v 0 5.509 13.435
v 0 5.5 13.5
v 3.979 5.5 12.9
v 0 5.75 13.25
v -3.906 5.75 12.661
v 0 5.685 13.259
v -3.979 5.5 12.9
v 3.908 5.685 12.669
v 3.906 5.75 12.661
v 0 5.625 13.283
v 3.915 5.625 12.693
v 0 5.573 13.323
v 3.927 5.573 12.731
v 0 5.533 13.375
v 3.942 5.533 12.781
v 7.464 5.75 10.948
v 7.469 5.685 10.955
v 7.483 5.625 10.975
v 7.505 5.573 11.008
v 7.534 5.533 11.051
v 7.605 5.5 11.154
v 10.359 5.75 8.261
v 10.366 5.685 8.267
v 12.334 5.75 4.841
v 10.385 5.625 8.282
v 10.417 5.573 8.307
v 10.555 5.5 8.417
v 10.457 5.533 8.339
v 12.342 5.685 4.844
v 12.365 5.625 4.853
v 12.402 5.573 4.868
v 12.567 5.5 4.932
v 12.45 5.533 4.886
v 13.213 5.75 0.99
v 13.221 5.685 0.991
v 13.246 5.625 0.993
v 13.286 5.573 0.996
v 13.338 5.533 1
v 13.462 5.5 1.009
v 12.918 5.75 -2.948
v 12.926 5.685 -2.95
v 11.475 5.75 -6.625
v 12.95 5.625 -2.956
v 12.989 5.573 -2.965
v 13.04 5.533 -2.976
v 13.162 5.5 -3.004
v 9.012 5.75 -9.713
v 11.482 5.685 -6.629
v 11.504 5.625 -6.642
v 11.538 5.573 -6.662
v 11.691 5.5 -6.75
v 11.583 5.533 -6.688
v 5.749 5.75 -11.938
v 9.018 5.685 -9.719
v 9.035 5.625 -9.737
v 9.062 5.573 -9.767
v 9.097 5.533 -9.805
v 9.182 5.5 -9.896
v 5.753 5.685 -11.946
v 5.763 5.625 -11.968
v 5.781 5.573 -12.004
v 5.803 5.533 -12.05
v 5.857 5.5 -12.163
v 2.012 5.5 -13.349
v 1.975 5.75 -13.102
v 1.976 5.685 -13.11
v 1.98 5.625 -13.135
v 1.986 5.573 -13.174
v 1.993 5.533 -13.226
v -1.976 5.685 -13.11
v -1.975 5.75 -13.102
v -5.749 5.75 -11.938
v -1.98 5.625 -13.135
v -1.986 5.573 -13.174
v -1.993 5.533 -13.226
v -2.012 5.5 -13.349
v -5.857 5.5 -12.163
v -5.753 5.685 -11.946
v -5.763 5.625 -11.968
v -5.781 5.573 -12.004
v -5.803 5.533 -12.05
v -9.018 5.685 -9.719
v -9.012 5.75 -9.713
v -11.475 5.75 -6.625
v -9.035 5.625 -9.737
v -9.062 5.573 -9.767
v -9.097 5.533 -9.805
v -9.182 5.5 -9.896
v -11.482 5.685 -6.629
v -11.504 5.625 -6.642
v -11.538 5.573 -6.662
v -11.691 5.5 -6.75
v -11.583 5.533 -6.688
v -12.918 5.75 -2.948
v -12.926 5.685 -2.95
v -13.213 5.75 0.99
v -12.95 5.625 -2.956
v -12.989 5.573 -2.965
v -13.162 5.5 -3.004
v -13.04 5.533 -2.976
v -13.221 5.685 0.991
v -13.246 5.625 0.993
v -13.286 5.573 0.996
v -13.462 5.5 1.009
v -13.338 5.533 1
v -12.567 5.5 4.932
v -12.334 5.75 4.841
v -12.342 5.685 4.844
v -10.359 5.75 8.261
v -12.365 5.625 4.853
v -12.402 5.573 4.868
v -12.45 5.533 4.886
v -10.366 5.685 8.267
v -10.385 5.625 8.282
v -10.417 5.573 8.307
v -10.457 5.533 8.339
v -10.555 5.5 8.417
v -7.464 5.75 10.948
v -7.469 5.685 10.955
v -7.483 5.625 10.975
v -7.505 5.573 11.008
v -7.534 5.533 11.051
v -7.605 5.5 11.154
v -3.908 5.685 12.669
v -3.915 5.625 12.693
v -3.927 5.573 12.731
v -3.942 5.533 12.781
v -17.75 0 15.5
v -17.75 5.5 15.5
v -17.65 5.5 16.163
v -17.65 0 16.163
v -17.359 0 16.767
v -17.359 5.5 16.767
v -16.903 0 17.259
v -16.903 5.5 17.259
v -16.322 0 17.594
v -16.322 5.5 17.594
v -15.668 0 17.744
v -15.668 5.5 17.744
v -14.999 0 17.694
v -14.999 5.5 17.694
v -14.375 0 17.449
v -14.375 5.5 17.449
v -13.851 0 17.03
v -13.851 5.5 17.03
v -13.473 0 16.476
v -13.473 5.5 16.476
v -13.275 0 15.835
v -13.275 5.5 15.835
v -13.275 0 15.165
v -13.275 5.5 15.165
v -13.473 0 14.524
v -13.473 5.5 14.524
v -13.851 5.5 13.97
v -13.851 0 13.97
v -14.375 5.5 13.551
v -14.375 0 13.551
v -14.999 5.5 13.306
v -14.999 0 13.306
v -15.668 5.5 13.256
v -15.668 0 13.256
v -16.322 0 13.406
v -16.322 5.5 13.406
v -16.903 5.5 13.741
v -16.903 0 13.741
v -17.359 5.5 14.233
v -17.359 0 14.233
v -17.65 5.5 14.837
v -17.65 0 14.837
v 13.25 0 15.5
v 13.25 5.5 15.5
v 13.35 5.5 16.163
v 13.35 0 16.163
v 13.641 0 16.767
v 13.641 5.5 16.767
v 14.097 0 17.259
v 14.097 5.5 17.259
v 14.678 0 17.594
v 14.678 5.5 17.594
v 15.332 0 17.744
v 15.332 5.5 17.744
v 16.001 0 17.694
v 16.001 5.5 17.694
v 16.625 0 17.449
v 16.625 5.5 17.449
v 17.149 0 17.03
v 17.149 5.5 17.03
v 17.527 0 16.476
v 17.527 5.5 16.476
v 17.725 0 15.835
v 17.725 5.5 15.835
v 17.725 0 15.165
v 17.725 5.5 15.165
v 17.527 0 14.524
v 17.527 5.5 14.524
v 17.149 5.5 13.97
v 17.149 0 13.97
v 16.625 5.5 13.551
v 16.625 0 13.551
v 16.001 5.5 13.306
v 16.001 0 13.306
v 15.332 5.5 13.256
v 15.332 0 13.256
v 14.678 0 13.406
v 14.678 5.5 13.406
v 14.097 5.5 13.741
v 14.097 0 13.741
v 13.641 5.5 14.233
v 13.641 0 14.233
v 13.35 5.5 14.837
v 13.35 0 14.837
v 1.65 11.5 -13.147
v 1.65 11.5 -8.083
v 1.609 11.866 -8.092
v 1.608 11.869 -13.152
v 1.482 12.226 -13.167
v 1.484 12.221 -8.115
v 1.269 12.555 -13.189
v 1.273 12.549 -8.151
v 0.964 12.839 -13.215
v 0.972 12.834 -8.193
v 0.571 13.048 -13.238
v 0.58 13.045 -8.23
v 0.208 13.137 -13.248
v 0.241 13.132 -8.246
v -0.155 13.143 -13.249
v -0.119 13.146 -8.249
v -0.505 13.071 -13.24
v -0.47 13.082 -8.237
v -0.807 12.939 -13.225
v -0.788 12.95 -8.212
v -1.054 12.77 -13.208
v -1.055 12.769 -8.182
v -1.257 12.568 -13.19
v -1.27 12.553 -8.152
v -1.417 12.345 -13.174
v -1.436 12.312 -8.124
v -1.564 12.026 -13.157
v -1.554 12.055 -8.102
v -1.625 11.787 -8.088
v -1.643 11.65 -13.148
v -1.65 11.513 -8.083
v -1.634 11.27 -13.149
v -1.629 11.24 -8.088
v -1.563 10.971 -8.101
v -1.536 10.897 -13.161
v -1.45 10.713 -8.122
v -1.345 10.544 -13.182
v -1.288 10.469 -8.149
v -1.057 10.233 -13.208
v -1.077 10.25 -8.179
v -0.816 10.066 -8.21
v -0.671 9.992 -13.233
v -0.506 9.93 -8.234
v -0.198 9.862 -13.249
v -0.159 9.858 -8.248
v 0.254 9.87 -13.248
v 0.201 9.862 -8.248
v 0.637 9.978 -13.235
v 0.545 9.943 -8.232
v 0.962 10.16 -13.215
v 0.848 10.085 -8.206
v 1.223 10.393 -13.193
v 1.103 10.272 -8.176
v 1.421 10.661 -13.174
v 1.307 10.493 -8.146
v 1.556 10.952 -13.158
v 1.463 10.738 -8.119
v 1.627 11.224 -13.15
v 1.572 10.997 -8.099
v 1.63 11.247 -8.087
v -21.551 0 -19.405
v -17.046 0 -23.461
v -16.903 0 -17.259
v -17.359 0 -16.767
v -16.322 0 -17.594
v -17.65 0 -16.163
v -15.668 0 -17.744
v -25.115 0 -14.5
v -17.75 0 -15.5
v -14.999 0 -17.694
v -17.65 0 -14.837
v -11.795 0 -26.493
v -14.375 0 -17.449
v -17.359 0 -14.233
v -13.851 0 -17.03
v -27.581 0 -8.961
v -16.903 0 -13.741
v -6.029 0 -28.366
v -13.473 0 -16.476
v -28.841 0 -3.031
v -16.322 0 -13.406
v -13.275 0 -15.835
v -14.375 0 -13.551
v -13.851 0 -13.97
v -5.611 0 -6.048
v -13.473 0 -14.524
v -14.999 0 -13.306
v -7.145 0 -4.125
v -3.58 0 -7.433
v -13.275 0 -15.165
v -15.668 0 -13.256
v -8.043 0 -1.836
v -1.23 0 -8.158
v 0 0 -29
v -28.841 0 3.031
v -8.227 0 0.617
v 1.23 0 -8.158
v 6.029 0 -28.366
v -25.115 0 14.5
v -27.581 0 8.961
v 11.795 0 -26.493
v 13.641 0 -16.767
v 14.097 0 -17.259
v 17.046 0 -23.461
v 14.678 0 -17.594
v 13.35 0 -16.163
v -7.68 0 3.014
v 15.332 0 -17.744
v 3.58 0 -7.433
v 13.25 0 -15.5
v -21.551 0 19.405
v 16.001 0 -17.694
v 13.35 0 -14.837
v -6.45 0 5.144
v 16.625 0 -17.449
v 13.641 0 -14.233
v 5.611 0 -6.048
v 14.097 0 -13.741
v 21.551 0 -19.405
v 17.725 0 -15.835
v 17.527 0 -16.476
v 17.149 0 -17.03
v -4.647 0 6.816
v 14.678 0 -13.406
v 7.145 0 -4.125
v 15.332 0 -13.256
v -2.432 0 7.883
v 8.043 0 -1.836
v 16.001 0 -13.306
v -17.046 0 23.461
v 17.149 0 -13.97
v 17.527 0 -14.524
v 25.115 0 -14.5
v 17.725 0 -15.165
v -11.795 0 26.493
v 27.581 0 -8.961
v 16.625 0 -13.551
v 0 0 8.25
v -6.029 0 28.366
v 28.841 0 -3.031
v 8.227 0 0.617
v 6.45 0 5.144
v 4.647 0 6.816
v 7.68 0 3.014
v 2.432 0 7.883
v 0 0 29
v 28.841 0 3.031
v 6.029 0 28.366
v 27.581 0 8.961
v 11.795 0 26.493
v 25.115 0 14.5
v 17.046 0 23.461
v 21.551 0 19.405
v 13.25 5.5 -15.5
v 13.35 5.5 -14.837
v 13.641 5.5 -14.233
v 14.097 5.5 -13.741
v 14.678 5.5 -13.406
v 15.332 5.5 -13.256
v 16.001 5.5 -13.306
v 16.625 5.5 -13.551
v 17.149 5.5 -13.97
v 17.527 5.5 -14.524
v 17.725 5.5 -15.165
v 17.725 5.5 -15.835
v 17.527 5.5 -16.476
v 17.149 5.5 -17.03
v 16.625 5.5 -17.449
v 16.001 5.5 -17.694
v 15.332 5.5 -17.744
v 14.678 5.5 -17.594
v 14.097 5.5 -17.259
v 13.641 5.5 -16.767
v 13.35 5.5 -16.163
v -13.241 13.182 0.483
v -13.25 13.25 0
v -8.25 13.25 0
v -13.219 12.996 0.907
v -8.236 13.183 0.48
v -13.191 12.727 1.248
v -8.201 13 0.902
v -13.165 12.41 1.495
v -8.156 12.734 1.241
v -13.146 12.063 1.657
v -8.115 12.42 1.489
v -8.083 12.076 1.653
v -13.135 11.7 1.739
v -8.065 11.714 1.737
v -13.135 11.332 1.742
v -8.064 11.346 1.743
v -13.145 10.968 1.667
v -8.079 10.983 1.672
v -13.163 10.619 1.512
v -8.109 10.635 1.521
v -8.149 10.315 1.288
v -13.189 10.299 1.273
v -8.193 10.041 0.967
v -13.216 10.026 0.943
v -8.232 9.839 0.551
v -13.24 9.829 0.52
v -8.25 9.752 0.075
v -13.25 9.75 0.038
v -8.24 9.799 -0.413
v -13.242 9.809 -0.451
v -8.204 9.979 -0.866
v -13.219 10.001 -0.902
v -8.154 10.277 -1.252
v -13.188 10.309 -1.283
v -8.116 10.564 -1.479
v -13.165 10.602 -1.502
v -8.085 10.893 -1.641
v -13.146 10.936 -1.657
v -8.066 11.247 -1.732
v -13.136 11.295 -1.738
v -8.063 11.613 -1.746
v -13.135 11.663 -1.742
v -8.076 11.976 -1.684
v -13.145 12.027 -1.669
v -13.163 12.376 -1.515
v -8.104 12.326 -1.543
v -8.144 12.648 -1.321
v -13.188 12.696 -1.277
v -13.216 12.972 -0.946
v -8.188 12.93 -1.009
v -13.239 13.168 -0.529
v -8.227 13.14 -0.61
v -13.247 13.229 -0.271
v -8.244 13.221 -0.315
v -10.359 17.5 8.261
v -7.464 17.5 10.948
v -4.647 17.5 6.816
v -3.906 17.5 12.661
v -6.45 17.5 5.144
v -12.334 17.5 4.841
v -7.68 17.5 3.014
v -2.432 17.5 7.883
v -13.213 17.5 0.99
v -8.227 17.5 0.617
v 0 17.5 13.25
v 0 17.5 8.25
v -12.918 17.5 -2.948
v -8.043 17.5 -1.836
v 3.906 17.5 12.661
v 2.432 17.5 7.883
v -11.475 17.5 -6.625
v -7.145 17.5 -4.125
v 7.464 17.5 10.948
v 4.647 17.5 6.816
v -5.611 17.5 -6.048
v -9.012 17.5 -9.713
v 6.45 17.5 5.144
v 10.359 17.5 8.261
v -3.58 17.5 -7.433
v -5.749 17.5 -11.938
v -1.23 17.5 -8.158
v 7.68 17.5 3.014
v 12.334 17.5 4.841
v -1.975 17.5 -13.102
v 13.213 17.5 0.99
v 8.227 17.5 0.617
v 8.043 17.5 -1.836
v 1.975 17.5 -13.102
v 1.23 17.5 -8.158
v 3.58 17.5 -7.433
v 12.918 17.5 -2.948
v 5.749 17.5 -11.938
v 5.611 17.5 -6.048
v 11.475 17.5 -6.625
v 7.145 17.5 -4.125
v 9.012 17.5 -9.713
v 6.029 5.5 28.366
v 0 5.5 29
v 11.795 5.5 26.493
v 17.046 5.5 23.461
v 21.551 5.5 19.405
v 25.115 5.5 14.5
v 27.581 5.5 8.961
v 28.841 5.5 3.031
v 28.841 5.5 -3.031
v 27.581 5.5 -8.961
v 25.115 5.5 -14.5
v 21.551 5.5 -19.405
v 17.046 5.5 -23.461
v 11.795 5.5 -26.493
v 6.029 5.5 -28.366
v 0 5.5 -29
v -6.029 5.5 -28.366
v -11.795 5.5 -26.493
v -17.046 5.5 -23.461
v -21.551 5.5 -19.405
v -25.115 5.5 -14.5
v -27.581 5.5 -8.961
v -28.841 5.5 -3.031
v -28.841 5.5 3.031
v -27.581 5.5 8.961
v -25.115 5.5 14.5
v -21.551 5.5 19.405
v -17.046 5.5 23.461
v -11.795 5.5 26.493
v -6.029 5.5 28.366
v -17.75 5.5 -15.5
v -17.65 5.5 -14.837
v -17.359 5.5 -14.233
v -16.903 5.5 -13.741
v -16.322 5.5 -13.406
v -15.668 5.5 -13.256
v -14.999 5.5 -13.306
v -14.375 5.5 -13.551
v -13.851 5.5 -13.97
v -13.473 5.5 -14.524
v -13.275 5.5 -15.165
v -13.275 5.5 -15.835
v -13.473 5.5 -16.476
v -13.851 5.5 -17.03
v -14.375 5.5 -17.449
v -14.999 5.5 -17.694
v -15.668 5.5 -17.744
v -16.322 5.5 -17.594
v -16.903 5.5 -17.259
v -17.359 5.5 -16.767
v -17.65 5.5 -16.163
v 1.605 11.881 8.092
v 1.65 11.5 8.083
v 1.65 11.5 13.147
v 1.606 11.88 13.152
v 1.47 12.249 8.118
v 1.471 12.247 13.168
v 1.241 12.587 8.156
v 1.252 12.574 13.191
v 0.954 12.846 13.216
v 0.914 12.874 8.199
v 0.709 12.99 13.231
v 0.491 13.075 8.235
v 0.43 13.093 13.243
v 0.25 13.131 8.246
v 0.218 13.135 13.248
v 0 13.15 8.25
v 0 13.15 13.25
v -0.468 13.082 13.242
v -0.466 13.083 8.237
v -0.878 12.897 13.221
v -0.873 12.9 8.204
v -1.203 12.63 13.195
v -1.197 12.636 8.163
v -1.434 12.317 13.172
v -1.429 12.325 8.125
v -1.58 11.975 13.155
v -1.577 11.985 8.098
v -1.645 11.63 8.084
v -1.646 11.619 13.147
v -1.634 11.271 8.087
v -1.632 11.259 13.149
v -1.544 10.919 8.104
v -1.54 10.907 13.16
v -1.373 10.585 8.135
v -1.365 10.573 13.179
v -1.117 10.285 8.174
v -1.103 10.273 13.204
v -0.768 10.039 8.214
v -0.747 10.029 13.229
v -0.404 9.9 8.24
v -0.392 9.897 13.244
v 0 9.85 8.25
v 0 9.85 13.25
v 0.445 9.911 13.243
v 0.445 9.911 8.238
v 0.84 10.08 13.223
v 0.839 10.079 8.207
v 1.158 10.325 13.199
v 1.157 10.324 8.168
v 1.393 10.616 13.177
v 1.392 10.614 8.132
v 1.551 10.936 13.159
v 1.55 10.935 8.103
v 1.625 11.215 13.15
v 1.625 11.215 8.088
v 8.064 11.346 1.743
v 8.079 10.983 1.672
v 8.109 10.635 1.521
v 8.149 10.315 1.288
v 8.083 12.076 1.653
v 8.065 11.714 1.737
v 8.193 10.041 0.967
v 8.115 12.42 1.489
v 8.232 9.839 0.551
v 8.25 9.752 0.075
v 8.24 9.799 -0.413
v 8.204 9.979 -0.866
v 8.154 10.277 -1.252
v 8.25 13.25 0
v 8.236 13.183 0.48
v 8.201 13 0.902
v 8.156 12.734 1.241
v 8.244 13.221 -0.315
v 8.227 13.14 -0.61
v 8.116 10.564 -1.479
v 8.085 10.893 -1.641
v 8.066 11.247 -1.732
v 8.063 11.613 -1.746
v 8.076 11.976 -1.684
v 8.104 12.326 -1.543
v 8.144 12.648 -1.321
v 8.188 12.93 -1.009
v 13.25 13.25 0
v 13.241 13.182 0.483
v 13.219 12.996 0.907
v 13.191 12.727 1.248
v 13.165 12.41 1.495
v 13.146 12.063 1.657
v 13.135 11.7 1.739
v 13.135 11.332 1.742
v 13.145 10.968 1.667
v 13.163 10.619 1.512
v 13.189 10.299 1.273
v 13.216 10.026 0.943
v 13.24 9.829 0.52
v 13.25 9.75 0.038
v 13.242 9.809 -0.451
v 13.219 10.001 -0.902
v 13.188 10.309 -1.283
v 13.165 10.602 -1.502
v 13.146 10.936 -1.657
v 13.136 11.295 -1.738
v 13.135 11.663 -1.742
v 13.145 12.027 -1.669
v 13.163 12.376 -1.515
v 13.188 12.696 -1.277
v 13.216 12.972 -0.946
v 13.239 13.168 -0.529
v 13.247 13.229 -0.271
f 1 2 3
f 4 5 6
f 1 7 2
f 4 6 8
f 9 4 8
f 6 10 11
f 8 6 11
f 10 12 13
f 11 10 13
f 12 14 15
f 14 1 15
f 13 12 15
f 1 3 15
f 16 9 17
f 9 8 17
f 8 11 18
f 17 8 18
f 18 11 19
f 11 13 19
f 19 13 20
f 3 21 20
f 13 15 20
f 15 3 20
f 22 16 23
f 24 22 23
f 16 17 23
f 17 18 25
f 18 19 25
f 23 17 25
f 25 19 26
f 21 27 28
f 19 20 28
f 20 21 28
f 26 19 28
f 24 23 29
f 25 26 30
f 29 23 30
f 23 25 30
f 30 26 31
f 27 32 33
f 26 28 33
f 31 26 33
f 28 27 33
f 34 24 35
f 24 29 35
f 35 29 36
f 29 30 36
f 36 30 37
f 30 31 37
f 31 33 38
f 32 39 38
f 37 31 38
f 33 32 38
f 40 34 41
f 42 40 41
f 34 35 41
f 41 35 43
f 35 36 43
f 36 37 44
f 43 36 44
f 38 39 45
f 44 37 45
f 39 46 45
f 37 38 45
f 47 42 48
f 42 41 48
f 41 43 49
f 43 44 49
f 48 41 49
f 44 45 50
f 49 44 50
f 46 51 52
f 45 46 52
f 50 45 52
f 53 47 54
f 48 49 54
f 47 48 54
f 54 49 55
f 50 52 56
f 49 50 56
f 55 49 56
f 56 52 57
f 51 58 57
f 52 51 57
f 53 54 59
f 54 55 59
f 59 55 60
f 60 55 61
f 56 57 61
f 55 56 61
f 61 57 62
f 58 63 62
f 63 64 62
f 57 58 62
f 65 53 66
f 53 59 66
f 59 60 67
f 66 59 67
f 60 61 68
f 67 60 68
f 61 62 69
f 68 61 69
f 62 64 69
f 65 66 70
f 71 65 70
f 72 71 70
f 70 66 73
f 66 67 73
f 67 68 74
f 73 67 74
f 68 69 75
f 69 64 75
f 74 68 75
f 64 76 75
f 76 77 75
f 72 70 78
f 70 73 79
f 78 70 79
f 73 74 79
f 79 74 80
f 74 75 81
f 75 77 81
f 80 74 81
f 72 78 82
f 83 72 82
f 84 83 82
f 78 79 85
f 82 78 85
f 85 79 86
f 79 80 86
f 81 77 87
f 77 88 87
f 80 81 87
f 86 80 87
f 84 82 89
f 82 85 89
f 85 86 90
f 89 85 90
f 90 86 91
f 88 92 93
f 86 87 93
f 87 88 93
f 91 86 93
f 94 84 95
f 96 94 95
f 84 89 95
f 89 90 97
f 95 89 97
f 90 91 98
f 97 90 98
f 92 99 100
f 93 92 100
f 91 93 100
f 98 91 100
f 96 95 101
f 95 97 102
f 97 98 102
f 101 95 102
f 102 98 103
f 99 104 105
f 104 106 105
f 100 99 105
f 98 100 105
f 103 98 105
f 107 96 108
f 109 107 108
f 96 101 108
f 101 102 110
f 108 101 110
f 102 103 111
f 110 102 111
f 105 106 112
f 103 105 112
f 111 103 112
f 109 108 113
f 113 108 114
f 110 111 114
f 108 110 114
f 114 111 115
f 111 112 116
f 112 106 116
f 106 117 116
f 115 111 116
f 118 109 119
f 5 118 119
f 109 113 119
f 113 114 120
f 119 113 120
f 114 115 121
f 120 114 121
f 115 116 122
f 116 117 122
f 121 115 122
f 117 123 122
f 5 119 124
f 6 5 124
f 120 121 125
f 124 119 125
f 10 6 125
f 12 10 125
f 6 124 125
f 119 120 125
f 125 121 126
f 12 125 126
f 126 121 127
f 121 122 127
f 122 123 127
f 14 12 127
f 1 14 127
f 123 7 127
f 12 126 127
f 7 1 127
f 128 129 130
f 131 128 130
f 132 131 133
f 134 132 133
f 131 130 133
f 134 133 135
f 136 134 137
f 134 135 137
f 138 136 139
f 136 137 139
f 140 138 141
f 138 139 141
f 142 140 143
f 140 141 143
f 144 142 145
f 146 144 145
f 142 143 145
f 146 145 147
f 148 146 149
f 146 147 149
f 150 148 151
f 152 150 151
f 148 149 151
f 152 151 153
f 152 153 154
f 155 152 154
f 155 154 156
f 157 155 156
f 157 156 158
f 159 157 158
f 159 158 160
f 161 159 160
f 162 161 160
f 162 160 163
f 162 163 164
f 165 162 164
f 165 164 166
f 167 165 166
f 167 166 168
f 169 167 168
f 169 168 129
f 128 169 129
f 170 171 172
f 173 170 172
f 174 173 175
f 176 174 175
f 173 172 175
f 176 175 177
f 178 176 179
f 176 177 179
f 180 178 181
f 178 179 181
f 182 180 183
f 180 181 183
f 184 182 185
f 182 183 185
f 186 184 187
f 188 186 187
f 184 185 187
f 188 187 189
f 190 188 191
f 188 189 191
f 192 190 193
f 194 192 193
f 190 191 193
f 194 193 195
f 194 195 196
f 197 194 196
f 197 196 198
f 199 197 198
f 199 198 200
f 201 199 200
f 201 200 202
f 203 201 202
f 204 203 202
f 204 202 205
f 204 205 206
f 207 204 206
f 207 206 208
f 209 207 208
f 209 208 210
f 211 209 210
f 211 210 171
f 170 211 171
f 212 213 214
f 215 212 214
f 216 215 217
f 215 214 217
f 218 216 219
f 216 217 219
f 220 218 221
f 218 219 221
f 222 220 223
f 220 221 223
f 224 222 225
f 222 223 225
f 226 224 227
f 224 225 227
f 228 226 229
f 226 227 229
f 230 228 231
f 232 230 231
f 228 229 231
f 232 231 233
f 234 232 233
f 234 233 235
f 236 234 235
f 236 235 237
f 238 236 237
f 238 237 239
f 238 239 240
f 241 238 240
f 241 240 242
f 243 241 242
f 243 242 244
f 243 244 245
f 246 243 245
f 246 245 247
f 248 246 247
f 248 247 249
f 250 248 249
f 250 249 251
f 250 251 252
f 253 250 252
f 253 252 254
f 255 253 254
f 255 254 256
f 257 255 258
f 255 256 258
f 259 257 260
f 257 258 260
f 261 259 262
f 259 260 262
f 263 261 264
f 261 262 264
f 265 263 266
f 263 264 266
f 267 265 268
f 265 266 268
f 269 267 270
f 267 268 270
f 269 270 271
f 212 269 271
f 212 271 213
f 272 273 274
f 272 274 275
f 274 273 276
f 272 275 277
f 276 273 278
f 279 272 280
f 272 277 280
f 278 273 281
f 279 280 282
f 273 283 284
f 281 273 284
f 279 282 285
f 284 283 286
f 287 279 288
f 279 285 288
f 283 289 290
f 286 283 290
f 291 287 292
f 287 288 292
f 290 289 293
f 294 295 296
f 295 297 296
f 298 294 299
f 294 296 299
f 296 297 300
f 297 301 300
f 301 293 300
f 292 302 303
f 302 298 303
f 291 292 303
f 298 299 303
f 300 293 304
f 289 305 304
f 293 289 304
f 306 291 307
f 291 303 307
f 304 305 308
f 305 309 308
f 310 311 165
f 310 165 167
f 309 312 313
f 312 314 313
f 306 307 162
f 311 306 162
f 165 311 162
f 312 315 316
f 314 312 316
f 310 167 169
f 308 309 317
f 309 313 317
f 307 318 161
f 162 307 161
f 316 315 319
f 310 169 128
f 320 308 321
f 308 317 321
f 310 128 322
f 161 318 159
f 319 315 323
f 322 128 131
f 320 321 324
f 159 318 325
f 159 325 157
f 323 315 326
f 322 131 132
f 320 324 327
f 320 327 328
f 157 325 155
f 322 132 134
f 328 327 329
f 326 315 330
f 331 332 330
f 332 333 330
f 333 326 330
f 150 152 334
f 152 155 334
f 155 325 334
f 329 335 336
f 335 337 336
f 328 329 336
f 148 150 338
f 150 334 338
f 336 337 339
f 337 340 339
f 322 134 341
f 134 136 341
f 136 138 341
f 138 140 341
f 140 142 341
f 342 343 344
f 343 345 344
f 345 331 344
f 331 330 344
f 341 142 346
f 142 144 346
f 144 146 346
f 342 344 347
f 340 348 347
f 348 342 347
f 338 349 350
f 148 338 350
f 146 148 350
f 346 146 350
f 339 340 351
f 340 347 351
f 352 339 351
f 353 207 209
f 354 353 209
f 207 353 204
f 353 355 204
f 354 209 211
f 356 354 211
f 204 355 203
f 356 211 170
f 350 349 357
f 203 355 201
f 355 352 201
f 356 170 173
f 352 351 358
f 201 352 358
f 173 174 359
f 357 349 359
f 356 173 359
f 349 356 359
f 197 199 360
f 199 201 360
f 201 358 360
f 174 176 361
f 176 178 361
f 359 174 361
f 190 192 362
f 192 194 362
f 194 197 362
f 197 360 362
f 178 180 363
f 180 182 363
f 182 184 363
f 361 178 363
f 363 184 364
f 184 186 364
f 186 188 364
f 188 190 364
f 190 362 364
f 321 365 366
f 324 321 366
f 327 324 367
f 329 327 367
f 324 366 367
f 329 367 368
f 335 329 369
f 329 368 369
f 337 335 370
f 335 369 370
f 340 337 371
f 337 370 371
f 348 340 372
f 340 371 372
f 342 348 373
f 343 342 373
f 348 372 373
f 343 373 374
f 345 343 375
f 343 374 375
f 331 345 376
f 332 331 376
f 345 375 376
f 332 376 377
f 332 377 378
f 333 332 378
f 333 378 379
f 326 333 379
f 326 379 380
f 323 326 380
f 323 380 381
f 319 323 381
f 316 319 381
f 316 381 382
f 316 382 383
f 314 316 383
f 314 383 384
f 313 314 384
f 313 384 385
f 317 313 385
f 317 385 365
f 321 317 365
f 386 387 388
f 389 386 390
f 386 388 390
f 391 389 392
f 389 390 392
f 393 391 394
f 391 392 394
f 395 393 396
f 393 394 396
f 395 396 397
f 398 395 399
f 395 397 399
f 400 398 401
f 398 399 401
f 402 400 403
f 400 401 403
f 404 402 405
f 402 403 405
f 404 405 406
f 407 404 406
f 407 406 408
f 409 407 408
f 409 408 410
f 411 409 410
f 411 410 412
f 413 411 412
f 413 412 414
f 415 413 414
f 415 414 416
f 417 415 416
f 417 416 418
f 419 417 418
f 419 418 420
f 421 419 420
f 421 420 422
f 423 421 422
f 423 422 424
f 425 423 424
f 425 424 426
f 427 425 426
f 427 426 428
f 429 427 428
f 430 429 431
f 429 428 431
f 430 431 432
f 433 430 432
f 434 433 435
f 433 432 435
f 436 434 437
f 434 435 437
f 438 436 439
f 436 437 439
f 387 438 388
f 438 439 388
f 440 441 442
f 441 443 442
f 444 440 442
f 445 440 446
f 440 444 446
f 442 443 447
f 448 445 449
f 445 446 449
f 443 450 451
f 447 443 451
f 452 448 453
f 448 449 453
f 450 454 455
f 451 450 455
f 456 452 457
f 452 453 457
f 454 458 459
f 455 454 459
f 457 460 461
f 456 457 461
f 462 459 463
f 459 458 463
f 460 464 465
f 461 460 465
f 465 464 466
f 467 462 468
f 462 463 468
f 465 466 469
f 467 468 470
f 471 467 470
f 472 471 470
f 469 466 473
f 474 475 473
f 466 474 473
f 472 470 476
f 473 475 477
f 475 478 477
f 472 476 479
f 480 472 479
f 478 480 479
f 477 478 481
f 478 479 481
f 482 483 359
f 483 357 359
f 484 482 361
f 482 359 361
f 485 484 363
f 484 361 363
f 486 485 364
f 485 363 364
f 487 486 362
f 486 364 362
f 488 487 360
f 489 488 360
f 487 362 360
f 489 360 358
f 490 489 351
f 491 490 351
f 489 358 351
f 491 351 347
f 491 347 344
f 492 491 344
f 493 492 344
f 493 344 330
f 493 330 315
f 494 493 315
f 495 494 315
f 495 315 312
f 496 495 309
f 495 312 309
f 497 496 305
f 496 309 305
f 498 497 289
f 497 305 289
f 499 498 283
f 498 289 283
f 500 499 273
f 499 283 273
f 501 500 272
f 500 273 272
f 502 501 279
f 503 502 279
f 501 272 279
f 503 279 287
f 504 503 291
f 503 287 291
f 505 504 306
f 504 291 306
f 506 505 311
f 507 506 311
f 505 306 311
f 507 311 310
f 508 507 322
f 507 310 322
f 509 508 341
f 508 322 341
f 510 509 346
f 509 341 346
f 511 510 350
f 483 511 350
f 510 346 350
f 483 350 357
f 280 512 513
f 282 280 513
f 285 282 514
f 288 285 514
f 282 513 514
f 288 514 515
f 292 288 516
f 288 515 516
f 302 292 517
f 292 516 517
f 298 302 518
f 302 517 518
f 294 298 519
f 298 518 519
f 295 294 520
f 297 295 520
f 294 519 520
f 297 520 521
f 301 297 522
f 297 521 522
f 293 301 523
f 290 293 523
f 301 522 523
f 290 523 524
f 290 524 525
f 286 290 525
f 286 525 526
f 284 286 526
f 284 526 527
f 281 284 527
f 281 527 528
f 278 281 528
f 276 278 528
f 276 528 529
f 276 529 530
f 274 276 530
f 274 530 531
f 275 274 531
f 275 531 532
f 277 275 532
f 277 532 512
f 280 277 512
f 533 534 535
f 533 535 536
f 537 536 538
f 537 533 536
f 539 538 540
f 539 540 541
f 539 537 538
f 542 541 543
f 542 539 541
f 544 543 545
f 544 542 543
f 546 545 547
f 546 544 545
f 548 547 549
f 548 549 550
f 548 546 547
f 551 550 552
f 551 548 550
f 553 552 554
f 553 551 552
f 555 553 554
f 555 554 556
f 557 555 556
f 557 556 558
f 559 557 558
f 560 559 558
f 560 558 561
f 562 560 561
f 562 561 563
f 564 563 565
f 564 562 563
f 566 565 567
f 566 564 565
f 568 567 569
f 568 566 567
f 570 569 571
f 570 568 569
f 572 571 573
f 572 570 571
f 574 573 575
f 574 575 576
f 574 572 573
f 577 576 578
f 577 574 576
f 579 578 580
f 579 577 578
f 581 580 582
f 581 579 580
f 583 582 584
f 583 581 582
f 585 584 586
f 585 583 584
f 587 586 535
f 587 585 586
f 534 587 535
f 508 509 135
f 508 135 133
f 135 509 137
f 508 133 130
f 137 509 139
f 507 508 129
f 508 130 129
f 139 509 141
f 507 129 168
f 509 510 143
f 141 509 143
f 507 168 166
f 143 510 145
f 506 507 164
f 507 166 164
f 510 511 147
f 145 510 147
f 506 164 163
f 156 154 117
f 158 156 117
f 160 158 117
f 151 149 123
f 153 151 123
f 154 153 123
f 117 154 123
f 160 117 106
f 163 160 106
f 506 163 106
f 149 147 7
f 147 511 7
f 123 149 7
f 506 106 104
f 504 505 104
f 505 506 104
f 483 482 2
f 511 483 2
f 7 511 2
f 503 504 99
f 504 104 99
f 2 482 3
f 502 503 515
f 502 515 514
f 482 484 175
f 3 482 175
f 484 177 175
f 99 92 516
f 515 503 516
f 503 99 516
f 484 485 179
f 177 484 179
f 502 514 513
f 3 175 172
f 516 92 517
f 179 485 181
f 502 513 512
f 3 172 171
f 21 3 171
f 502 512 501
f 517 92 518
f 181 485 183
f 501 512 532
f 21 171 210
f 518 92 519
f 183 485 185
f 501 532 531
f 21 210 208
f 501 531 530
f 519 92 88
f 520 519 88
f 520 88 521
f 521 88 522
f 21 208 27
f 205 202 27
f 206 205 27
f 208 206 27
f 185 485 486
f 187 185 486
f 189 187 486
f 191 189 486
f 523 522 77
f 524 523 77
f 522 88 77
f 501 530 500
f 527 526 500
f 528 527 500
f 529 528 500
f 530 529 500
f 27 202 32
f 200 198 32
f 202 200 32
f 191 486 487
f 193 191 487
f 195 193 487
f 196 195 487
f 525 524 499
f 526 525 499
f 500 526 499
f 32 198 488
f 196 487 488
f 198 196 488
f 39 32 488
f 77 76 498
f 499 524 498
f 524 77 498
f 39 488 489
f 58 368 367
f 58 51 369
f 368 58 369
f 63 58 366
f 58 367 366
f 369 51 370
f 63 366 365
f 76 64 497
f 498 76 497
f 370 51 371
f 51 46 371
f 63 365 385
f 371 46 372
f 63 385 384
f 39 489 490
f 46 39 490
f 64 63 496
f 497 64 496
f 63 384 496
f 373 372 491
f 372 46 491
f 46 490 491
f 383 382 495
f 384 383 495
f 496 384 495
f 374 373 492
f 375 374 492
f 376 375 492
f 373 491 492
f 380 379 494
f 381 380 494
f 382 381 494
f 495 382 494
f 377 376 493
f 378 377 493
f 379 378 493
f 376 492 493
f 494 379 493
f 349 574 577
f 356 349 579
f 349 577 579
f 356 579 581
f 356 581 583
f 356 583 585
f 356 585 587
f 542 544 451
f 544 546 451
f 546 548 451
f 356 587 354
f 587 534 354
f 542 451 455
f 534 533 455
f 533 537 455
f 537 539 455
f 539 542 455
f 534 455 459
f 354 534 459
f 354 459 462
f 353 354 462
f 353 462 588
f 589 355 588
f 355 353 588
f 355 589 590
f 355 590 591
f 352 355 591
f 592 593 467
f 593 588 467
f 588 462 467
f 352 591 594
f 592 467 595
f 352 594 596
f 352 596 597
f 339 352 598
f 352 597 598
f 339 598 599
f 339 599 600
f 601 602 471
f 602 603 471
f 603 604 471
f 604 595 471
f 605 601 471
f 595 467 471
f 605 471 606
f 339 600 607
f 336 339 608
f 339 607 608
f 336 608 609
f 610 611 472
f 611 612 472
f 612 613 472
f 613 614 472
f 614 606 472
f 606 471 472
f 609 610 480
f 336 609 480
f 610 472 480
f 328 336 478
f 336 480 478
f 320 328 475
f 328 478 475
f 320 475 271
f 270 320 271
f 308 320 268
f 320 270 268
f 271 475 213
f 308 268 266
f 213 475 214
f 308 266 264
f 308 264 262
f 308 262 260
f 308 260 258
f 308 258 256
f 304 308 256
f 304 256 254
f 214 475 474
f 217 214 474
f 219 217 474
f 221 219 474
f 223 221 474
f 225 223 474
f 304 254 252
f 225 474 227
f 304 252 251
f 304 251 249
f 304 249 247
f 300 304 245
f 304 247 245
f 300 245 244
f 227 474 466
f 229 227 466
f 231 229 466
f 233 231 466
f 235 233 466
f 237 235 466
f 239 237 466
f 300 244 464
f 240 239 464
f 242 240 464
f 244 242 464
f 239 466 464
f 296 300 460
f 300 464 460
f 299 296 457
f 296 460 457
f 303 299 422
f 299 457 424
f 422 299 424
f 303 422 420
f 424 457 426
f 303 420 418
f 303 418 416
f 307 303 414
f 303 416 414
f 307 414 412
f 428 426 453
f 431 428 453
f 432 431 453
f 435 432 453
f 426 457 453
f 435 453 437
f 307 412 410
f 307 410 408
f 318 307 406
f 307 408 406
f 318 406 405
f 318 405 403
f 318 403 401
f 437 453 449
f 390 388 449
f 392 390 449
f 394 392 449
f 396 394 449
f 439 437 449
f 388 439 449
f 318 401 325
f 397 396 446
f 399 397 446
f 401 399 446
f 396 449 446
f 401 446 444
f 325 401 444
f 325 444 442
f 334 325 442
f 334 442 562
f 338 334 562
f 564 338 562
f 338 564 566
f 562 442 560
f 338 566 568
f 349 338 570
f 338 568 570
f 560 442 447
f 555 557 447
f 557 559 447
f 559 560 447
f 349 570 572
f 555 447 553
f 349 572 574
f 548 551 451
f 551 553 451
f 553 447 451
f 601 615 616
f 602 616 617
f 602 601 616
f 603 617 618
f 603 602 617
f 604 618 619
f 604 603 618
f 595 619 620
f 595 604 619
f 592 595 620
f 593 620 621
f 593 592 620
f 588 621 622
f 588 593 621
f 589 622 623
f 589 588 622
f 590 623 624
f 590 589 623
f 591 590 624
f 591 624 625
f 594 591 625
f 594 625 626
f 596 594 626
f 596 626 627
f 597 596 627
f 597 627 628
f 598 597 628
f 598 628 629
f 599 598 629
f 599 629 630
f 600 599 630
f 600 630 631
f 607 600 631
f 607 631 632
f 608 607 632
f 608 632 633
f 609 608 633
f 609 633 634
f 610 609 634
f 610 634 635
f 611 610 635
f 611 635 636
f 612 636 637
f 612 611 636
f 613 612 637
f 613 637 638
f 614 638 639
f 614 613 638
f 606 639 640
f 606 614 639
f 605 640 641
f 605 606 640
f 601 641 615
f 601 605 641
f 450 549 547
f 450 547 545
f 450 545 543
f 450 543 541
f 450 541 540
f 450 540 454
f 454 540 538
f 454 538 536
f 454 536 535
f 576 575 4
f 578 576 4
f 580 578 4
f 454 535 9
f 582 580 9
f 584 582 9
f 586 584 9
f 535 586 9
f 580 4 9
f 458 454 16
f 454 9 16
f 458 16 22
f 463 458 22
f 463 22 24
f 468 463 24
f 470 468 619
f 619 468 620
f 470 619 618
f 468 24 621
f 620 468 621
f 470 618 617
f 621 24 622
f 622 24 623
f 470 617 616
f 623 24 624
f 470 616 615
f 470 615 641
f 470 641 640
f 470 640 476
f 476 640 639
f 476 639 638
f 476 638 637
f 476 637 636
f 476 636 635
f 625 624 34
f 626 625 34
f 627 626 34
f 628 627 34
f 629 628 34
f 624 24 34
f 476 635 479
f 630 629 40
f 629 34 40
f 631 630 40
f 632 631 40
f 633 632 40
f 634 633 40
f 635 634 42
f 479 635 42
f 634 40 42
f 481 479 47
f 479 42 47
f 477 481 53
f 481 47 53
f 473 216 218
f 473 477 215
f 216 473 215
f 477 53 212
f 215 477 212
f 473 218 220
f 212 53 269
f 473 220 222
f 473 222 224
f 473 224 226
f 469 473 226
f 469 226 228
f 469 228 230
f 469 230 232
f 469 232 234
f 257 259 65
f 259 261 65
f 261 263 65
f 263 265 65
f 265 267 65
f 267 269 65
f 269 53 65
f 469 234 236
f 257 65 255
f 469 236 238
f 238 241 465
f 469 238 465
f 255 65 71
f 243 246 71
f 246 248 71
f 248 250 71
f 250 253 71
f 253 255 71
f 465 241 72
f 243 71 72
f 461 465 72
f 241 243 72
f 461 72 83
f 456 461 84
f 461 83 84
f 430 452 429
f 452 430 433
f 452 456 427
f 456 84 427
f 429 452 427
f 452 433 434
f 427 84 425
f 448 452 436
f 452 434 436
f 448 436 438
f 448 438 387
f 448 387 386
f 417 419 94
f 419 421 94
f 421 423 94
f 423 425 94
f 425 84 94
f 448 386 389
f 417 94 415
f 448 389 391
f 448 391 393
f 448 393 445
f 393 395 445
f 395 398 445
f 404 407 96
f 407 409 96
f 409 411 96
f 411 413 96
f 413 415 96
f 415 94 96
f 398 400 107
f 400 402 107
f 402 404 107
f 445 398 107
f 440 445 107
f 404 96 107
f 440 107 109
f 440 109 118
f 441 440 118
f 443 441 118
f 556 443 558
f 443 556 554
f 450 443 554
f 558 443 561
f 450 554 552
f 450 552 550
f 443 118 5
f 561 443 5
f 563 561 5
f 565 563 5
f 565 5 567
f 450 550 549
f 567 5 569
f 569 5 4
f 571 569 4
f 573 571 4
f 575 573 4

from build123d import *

# Parameters (mm, degrees)
F2_R          = 0.25
F3_R          = 2.25
F4_DEPTH      = 25
F5_R          = 1.65
F6_DEPTH      = 25
F6_DEPTH_BACK = 25
F7_R          = 1.75
F8_DEPTH      = 25
F8_DEPTH_BACK = 25


with BuildPart() as f1:
    # F0 (on Right) → F1 (revolve)
    with BuildSketch(Plane.YZ):
        Polygon((0, 29), (0, 8.25), (17.5, 8.25), (17.5, 13.25), (5.5, 13.25), (5.5, 29), align=None)
    revolve(axis=Axis((0, 5.341735, 0), (0, 1, 0)))

    # F2
    f2_edges = [f1.edges().sort_by_distance(p)[0] for p in [
        (0, 5.5, -13.25),
    ]]
    fillet(f2_edges, radius=F2_R)

    # F3 (on face) → F4 (cut)
    with BuildSketch(Plane(origin=(0, 5.5, 0), x_dir=(-1, 0, 0), z_dir=(0, 1, 0))):
        with Locations((-15.5, 15.5)):
            Circle(F3_R)
        with Locations((15.5, 15.5)):
            Circle(F3_R)
        with Locations((-15.5, -15.5)):
            Circle(F3_R)
        with Locations((15.5, -15.5)):
            Circle(F3_R)
    extrude(amount=-F4_DEPTH, mode=Mode.SUBTRACT)

    # F5 (on Top) → F6 (cut, two sides)
    with BuildSketch(Plane.XY) as f6_sk:
        with Locations((0, 11.5)):
            Circle(F5_R)
    extrude(amount=F6_DEPTH, mode=Mode.SUBTRACT)
    extrude(f6_sk.sketch, amount=-F6_DEPTH_BACK, mode=Mode.SUBTRACT)

    # F7 (on Right) → F8 (cut, two sides)
    with BuildSketch(Plane.YZ) as f8_sk:
        with Locations((11.5, 0)):
            Circle(F7_R)
    extrude(amount=F8_DEPTH, mode=Mode.SUBTRACT)
    extrude(f8_sk.sketch, amount=-F8_DEPTH_BACK, mode=Mode.SUBTRACT)


solid = f1.part
